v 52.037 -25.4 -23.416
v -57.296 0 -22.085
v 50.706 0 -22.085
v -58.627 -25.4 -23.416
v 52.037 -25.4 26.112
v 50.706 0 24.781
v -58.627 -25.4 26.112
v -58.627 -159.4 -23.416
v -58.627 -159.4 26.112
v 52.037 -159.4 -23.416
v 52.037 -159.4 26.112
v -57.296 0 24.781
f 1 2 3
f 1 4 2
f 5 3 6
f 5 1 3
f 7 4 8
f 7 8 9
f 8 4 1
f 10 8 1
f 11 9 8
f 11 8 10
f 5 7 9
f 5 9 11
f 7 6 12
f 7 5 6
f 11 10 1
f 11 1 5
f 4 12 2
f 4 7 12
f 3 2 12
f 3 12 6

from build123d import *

# Parameters (mm, degrees)
F1_W     = 108.002141118
F1_H     = 46.8662679195
F2_DEPTH = 25.4
F2_TAPER = -3
F3_DEPTH = 134


with BuildPart() as f2:
    # F1 (on face) → F2 (new body)
    with BuildSketch(Plane.XZ):
        with Locations((-3.2949671149, 1.3480186462)):
            Rectangle(F1_W, F1_H)
    extrude(amount=F2_DEPTH, taper=F2_TAPER)

    # F3 (add): a face of the model
    f3_faces = [f2.faces().sort_by_distance(p)[0] for p in [
        (-3.2949671149, -25.4, 1.3480186462),
    ]]
    extrude(f3_faces, amount=F3_DEPTH)


solid = f2.part
